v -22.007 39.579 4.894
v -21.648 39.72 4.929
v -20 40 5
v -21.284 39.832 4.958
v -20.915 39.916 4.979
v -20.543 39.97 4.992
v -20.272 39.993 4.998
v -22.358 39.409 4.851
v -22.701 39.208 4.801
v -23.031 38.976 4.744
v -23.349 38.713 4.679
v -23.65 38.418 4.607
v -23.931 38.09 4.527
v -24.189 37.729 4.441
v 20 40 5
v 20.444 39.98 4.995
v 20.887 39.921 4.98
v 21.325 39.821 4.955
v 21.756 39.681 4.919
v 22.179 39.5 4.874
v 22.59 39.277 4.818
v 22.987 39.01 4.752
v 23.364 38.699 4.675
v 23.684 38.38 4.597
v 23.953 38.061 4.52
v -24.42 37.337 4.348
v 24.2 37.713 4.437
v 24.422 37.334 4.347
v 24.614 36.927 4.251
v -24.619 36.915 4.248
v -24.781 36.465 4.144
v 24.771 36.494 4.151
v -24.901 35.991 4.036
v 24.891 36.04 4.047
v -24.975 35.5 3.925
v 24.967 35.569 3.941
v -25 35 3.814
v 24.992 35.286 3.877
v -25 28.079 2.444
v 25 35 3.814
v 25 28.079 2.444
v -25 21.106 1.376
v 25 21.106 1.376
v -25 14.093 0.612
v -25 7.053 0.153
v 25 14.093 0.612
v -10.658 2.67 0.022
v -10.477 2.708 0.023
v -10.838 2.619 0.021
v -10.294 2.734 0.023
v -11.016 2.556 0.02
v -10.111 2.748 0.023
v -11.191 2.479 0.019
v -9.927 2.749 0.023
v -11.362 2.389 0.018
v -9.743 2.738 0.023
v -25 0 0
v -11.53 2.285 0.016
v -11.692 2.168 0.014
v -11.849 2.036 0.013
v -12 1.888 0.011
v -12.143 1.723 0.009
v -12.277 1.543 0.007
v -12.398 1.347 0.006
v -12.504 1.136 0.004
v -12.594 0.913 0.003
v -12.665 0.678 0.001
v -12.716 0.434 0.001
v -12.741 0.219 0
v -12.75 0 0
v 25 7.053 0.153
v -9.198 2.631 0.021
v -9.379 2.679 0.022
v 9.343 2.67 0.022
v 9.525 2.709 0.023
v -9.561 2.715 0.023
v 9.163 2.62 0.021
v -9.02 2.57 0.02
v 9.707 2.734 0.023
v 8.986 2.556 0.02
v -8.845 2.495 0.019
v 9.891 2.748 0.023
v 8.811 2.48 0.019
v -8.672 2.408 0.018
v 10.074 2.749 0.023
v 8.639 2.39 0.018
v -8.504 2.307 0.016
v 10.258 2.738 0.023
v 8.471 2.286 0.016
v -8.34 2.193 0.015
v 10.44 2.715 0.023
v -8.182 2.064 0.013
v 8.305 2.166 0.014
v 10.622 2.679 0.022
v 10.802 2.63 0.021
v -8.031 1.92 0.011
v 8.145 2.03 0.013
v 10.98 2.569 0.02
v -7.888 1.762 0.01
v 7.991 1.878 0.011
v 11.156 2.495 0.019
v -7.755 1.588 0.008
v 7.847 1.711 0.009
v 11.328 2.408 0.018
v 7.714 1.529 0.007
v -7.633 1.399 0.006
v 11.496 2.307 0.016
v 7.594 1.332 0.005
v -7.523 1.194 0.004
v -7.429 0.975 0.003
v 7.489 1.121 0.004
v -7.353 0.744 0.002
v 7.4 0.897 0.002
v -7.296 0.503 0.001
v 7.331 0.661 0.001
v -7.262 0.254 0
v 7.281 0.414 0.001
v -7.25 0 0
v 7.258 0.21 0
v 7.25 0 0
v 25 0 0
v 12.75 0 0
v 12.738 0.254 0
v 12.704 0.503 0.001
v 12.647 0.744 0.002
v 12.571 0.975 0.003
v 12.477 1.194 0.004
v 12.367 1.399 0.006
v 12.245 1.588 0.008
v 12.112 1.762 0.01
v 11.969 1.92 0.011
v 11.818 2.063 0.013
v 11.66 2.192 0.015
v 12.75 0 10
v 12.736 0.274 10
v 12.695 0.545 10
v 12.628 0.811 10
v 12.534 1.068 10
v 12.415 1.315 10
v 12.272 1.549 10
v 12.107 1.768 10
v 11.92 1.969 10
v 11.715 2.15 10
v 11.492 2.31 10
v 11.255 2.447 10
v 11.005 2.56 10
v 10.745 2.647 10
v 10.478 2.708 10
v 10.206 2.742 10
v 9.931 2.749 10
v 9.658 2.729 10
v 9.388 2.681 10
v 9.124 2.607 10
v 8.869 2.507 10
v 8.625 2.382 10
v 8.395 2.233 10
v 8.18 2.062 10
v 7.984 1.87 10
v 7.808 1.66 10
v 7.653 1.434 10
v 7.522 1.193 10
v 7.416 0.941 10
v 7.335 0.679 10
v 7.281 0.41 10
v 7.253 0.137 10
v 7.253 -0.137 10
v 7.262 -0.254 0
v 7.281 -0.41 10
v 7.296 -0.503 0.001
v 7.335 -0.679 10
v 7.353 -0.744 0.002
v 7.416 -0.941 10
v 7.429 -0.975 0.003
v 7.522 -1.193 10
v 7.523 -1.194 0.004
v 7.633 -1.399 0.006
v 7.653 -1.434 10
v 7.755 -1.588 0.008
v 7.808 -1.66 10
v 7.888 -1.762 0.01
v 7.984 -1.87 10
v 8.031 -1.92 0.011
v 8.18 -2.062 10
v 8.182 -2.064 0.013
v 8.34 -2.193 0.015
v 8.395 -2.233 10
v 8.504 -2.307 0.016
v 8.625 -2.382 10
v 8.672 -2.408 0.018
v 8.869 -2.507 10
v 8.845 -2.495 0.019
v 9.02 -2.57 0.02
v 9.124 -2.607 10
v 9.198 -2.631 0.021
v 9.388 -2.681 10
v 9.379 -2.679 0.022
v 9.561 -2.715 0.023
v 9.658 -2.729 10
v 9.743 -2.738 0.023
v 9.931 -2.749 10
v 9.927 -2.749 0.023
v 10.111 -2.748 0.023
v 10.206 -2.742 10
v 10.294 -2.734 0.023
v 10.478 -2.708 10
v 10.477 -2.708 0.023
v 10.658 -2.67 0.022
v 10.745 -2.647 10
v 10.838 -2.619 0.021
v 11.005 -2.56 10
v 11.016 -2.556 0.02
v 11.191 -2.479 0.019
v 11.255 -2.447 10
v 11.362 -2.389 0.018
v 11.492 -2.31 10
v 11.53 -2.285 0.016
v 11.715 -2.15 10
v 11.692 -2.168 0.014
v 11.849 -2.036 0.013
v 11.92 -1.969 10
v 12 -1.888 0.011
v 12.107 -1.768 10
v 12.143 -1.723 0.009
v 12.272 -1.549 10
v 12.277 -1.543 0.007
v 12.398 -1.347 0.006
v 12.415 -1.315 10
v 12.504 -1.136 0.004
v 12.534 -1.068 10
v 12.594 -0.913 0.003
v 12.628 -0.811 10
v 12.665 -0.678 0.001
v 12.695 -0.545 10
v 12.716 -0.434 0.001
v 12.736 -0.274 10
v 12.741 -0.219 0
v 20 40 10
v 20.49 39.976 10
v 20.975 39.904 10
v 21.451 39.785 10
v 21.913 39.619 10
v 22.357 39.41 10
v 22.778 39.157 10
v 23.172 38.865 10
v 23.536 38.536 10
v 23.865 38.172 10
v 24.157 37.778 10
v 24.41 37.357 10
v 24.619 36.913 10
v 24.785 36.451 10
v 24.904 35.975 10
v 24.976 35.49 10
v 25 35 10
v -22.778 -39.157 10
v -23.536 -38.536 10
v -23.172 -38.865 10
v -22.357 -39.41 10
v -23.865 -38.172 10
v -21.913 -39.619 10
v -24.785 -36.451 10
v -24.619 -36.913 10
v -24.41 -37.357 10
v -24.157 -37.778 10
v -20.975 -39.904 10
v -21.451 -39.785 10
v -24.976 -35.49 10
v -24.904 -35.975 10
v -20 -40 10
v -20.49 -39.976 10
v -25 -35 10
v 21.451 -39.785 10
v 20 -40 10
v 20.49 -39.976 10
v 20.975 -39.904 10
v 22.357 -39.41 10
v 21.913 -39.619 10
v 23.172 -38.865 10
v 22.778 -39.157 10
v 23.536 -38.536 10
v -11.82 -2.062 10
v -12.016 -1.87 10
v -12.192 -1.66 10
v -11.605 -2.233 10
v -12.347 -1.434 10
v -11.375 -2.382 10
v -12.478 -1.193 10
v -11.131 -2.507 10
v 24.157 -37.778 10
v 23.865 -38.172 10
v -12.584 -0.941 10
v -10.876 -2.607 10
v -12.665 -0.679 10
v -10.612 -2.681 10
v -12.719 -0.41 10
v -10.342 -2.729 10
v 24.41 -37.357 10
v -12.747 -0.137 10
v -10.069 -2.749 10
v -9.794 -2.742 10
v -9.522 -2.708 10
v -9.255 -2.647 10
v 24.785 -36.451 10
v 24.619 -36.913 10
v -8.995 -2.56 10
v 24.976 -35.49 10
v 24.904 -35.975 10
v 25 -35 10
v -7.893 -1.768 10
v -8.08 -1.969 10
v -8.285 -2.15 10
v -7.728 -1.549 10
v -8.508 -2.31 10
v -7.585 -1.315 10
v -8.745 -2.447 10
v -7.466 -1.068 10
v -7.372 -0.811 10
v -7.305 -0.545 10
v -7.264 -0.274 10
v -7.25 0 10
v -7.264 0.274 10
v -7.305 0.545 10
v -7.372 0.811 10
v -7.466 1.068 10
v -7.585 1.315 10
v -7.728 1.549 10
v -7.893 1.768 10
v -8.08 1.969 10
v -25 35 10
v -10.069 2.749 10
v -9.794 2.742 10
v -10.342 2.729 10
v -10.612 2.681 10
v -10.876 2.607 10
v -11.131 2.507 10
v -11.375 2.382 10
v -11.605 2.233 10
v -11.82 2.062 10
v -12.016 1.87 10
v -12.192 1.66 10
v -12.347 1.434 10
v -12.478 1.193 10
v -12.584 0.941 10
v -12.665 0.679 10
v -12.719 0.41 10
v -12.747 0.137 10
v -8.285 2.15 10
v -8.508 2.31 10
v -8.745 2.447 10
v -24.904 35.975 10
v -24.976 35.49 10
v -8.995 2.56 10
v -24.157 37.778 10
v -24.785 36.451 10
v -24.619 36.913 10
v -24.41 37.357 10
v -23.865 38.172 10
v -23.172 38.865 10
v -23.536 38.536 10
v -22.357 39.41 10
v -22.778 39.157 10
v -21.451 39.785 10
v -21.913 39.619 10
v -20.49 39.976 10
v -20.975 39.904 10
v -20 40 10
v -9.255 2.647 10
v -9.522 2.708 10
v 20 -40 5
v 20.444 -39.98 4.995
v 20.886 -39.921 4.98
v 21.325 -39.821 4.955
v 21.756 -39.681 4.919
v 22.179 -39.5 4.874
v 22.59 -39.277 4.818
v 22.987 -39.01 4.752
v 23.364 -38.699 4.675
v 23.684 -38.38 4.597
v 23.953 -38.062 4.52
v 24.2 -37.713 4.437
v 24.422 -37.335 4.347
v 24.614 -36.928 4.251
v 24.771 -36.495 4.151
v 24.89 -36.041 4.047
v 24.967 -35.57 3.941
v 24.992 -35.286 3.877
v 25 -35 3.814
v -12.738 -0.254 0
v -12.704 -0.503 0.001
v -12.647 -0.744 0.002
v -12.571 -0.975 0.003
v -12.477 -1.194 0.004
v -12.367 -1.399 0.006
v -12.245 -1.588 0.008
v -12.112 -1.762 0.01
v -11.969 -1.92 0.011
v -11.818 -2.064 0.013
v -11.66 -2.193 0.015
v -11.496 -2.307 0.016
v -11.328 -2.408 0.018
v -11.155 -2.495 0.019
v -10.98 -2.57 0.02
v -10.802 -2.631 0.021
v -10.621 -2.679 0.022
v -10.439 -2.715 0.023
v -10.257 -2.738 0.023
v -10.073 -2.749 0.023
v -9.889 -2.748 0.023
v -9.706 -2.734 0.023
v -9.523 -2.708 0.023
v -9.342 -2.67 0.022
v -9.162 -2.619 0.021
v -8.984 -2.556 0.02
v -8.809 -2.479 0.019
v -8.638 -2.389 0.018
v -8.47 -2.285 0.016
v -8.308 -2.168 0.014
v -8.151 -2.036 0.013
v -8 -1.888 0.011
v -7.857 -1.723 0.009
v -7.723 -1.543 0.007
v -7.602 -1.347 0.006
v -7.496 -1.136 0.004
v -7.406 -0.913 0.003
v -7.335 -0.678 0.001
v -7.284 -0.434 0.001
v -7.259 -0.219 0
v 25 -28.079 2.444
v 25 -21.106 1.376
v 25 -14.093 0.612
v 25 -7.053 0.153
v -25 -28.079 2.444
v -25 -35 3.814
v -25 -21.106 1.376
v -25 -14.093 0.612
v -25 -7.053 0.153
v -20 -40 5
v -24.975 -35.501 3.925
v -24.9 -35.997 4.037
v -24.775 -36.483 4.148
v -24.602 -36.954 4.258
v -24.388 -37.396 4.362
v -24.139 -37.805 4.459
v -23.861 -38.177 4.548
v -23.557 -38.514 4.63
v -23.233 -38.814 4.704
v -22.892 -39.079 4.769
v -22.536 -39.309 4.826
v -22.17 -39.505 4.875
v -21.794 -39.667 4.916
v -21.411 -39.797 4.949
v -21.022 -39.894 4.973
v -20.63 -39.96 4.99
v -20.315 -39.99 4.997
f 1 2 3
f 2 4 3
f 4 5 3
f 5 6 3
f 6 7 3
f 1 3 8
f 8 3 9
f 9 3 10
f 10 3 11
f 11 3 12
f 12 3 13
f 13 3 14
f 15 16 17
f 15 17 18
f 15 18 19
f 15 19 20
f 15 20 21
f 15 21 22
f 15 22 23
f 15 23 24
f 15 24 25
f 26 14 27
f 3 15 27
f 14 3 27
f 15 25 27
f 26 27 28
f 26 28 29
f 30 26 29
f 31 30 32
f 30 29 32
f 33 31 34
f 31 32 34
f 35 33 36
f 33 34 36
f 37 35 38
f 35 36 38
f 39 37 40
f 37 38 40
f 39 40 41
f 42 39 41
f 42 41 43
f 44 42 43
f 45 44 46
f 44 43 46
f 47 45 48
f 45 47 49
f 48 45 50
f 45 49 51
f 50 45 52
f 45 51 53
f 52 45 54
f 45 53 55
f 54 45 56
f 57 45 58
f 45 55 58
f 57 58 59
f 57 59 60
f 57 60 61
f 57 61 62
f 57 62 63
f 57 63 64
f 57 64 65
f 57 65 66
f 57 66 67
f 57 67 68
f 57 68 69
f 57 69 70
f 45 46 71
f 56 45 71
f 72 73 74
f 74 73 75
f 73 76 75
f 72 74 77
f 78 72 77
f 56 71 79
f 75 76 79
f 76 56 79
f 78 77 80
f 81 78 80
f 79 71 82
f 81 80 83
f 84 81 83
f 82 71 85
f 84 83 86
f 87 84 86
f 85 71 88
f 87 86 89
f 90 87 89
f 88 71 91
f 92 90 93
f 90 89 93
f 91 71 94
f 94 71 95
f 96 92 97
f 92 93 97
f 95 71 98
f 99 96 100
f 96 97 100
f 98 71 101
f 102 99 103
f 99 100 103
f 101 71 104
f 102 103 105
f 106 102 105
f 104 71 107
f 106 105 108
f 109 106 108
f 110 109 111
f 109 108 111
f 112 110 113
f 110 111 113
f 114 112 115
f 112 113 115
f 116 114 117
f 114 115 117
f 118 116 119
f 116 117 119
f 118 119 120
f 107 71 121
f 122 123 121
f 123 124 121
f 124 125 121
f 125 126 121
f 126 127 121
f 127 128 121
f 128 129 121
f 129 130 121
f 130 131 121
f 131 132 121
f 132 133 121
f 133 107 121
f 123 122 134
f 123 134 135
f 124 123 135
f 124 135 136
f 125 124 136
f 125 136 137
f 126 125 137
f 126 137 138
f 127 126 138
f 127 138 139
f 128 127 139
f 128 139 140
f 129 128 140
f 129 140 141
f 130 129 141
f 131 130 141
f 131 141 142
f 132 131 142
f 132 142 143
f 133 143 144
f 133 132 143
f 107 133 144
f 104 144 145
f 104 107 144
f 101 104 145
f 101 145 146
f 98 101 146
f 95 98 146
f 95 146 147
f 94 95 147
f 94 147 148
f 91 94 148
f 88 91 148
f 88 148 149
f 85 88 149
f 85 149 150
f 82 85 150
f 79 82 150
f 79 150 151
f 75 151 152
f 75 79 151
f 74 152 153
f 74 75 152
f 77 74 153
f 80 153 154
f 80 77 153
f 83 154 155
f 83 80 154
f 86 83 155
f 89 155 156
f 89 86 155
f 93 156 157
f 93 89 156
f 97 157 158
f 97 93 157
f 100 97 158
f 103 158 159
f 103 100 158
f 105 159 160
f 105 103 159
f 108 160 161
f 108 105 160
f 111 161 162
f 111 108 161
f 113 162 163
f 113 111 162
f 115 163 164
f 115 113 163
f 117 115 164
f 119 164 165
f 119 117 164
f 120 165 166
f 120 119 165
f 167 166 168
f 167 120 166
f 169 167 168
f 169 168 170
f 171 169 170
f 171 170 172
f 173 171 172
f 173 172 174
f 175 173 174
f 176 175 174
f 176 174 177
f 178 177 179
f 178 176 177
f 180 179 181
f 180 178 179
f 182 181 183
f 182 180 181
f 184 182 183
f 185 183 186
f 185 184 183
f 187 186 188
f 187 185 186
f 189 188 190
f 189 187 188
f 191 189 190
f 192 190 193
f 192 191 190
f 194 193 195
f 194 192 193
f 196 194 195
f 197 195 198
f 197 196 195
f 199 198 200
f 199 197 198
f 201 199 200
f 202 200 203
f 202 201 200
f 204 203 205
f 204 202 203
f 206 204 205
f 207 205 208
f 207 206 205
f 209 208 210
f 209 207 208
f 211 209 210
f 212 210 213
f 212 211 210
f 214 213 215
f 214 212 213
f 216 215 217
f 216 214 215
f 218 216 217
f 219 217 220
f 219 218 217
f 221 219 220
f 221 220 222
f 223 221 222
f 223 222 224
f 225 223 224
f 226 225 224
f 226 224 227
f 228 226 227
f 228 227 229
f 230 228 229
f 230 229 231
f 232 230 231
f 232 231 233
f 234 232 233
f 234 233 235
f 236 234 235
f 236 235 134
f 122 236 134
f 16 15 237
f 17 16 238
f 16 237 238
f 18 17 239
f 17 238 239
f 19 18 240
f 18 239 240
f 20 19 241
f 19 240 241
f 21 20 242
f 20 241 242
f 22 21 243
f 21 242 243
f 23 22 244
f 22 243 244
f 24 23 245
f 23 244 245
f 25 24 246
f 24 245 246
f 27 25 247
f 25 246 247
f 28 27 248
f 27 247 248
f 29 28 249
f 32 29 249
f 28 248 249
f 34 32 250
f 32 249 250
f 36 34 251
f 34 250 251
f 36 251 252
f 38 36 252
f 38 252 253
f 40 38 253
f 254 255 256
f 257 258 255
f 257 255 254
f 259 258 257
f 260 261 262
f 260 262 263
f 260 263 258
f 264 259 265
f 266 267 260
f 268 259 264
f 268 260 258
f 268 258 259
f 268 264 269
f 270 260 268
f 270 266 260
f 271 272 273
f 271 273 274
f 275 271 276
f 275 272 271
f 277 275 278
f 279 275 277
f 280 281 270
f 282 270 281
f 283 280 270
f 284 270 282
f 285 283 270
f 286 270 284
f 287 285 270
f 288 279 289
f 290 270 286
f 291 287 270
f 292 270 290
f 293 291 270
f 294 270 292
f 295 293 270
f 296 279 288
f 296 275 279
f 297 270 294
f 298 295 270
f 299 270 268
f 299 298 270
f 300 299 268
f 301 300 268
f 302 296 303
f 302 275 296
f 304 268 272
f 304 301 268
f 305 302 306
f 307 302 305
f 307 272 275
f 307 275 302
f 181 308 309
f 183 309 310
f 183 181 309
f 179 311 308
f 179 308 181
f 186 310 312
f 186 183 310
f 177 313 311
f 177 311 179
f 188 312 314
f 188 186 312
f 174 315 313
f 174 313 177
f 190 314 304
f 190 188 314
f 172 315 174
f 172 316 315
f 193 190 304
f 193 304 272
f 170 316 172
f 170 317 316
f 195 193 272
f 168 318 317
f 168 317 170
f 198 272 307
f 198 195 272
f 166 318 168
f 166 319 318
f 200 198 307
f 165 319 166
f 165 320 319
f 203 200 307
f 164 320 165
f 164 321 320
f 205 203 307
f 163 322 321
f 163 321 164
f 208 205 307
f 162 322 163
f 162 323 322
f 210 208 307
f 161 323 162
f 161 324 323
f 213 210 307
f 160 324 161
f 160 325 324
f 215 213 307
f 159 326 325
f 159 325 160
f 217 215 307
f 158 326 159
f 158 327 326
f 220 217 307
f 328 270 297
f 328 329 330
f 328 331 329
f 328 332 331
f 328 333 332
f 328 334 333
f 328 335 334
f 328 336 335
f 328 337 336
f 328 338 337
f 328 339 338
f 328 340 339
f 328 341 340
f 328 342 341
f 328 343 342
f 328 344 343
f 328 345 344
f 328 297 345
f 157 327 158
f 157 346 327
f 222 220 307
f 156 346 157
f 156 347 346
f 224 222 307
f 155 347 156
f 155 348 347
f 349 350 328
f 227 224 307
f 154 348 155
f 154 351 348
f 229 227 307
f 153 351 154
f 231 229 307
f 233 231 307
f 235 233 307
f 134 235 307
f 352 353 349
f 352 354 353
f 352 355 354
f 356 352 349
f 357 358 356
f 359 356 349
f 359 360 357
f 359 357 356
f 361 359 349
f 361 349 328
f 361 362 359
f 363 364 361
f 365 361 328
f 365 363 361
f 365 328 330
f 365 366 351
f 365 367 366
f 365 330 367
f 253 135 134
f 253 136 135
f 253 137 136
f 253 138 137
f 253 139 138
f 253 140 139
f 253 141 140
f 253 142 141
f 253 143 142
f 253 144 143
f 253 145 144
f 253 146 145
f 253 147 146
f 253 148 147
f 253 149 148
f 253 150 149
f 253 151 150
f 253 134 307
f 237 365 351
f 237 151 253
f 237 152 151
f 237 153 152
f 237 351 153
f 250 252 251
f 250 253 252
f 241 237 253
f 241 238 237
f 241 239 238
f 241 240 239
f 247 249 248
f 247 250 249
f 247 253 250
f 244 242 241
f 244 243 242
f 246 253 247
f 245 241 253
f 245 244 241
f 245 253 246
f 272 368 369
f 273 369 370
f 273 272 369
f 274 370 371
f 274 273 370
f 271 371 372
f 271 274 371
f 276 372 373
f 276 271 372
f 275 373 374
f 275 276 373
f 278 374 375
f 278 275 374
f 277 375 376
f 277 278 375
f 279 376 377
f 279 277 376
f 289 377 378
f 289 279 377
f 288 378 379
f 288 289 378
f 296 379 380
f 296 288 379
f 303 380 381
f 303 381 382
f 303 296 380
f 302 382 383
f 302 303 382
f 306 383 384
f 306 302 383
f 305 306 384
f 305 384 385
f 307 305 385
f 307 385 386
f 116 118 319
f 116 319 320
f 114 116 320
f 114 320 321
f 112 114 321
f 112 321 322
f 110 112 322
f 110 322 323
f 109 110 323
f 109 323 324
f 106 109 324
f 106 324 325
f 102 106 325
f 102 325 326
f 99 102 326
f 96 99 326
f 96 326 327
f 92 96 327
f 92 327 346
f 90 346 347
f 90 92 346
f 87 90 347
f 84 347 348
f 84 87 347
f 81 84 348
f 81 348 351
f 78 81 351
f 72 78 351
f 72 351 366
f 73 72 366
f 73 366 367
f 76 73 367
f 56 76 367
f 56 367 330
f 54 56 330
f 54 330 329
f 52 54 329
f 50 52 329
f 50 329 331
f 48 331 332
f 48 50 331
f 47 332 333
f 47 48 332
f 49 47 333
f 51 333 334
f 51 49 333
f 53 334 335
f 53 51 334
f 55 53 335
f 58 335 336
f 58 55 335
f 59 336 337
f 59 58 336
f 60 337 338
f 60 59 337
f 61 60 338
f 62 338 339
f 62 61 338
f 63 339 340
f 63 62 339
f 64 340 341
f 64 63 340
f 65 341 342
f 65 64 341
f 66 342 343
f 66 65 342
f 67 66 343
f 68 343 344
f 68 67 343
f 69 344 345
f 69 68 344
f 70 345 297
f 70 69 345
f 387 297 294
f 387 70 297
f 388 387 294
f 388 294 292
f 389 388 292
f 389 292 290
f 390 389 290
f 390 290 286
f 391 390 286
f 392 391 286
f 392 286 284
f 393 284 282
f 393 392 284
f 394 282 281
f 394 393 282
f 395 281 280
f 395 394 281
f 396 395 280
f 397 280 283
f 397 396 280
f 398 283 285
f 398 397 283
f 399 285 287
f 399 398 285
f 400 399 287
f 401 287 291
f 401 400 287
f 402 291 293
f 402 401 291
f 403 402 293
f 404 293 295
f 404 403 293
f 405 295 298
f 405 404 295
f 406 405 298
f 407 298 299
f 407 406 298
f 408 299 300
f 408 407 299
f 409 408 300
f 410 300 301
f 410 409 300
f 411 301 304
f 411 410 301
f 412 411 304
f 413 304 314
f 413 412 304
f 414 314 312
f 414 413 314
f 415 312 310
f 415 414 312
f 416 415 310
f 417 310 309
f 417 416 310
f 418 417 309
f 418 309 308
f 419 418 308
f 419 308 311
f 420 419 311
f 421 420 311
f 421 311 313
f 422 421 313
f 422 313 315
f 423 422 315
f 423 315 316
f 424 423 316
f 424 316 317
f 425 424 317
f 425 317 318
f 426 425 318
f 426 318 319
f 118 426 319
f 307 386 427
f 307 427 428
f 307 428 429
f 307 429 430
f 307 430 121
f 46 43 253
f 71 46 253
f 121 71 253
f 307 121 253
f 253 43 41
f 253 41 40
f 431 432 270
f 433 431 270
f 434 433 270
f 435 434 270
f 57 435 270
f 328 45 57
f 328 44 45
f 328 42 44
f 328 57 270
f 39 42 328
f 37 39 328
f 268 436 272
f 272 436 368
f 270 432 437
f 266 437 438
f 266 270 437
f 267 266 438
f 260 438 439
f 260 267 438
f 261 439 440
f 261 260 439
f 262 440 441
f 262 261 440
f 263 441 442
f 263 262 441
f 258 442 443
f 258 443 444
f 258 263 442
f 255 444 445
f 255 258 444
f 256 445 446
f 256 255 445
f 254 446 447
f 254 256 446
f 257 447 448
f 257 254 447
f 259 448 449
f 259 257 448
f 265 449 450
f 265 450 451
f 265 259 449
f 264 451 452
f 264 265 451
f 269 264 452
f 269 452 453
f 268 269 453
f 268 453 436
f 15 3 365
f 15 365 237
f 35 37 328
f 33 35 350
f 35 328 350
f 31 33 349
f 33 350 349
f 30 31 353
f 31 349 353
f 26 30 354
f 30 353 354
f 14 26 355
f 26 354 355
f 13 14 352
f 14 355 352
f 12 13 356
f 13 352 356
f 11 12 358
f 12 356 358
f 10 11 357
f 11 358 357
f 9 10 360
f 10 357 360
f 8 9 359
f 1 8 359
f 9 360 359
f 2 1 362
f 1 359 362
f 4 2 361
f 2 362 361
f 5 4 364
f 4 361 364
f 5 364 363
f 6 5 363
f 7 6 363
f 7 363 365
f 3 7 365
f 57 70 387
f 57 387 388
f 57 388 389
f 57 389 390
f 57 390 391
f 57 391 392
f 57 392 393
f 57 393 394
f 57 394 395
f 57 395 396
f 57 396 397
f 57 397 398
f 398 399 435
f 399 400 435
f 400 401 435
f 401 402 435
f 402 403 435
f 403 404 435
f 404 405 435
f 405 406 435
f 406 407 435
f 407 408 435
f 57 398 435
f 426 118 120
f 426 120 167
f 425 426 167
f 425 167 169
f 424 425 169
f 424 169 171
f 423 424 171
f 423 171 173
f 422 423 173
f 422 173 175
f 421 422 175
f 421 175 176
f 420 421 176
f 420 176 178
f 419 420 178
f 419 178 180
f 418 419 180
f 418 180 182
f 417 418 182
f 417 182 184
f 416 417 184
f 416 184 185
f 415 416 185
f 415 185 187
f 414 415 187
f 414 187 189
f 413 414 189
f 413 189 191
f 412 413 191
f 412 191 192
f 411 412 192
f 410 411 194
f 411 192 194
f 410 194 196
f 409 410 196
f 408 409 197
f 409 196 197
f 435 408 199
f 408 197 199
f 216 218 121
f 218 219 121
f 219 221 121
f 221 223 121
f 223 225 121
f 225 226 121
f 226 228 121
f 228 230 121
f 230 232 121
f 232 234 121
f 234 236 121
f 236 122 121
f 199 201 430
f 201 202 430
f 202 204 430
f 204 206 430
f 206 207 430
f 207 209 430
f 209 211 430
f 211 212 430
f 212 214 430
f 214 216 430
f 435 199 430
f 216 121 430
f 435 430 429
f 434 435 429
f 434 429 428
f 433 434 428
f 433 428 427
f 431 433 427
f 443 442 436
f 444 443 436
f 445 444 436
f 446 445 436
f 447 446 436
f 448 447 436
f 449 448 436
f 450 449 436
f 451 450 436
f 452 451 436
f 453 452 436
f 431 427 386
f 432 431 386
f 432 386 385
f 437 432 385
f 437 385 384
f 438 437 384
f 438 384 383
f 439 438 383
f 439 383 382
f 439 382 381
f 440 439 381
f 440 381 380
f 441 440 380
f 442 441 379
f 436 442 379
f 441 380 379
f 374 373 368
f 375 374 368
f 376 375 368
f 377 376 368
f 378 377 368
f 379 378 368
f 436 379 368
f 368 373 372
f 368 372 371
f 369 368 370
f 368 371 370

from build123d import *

# Parameters (mm, degrees)
F0_W     = 50
F0_H     = 80
F0_R     = 2.75
F1_DEPTH = 10
F3_DEPTH = 50.001
F4_R     = 5


with BuildPart() as f1:
    # F0 (on Top) → F1 (new body)
    with BuildSketch(Plane.XY):
        Rectangle(F0_W, F0_H)
        with Locations((-10, 0)):
            Circle(F0_R, mode=Mode.SUBTRACT)
        with Locations((10, 0)):
            Circle(F0_R, mode=Mode.SUBTRACT)
    extrude(amount=F1_DEPTH)

    # F2 (on face) → F3 (cut, through all)
    with BuildSketch(Plane.YZ.offset(25)):
        with BuildLine():
            ThreePointArc((40, 5), (20.1556440913, 1.2548449991), (-5.632e-07, 0))
            Line((-5.632e-07, 0), (40, 0))
            Line((40, 0), (40, 5))
        make_face()
        with BuildLine():
            ThreePointArc((-5.632e-07, 0), (-20.1556446502, 1.254845069), (-40, 5))
            Line((-40, 5), (-40, 0))
            Line((-40, 0), (-5.632e-07, 0))
        make_face()
    extrude(amount=-F3_DEPTH, mode=Mode.SUBTRACT)

    # F4
    f4_edges = [f1.edges().sort_by_distance(p)[0] for p in [
        (25, -40, 7.5),
        (-25, -40, 7.5),
        (25, 40, 7.5),
        (-25, 40, 7.5),
    ]]
    fillet(f4_edges, radius=F4_R)


solid = f1.part
